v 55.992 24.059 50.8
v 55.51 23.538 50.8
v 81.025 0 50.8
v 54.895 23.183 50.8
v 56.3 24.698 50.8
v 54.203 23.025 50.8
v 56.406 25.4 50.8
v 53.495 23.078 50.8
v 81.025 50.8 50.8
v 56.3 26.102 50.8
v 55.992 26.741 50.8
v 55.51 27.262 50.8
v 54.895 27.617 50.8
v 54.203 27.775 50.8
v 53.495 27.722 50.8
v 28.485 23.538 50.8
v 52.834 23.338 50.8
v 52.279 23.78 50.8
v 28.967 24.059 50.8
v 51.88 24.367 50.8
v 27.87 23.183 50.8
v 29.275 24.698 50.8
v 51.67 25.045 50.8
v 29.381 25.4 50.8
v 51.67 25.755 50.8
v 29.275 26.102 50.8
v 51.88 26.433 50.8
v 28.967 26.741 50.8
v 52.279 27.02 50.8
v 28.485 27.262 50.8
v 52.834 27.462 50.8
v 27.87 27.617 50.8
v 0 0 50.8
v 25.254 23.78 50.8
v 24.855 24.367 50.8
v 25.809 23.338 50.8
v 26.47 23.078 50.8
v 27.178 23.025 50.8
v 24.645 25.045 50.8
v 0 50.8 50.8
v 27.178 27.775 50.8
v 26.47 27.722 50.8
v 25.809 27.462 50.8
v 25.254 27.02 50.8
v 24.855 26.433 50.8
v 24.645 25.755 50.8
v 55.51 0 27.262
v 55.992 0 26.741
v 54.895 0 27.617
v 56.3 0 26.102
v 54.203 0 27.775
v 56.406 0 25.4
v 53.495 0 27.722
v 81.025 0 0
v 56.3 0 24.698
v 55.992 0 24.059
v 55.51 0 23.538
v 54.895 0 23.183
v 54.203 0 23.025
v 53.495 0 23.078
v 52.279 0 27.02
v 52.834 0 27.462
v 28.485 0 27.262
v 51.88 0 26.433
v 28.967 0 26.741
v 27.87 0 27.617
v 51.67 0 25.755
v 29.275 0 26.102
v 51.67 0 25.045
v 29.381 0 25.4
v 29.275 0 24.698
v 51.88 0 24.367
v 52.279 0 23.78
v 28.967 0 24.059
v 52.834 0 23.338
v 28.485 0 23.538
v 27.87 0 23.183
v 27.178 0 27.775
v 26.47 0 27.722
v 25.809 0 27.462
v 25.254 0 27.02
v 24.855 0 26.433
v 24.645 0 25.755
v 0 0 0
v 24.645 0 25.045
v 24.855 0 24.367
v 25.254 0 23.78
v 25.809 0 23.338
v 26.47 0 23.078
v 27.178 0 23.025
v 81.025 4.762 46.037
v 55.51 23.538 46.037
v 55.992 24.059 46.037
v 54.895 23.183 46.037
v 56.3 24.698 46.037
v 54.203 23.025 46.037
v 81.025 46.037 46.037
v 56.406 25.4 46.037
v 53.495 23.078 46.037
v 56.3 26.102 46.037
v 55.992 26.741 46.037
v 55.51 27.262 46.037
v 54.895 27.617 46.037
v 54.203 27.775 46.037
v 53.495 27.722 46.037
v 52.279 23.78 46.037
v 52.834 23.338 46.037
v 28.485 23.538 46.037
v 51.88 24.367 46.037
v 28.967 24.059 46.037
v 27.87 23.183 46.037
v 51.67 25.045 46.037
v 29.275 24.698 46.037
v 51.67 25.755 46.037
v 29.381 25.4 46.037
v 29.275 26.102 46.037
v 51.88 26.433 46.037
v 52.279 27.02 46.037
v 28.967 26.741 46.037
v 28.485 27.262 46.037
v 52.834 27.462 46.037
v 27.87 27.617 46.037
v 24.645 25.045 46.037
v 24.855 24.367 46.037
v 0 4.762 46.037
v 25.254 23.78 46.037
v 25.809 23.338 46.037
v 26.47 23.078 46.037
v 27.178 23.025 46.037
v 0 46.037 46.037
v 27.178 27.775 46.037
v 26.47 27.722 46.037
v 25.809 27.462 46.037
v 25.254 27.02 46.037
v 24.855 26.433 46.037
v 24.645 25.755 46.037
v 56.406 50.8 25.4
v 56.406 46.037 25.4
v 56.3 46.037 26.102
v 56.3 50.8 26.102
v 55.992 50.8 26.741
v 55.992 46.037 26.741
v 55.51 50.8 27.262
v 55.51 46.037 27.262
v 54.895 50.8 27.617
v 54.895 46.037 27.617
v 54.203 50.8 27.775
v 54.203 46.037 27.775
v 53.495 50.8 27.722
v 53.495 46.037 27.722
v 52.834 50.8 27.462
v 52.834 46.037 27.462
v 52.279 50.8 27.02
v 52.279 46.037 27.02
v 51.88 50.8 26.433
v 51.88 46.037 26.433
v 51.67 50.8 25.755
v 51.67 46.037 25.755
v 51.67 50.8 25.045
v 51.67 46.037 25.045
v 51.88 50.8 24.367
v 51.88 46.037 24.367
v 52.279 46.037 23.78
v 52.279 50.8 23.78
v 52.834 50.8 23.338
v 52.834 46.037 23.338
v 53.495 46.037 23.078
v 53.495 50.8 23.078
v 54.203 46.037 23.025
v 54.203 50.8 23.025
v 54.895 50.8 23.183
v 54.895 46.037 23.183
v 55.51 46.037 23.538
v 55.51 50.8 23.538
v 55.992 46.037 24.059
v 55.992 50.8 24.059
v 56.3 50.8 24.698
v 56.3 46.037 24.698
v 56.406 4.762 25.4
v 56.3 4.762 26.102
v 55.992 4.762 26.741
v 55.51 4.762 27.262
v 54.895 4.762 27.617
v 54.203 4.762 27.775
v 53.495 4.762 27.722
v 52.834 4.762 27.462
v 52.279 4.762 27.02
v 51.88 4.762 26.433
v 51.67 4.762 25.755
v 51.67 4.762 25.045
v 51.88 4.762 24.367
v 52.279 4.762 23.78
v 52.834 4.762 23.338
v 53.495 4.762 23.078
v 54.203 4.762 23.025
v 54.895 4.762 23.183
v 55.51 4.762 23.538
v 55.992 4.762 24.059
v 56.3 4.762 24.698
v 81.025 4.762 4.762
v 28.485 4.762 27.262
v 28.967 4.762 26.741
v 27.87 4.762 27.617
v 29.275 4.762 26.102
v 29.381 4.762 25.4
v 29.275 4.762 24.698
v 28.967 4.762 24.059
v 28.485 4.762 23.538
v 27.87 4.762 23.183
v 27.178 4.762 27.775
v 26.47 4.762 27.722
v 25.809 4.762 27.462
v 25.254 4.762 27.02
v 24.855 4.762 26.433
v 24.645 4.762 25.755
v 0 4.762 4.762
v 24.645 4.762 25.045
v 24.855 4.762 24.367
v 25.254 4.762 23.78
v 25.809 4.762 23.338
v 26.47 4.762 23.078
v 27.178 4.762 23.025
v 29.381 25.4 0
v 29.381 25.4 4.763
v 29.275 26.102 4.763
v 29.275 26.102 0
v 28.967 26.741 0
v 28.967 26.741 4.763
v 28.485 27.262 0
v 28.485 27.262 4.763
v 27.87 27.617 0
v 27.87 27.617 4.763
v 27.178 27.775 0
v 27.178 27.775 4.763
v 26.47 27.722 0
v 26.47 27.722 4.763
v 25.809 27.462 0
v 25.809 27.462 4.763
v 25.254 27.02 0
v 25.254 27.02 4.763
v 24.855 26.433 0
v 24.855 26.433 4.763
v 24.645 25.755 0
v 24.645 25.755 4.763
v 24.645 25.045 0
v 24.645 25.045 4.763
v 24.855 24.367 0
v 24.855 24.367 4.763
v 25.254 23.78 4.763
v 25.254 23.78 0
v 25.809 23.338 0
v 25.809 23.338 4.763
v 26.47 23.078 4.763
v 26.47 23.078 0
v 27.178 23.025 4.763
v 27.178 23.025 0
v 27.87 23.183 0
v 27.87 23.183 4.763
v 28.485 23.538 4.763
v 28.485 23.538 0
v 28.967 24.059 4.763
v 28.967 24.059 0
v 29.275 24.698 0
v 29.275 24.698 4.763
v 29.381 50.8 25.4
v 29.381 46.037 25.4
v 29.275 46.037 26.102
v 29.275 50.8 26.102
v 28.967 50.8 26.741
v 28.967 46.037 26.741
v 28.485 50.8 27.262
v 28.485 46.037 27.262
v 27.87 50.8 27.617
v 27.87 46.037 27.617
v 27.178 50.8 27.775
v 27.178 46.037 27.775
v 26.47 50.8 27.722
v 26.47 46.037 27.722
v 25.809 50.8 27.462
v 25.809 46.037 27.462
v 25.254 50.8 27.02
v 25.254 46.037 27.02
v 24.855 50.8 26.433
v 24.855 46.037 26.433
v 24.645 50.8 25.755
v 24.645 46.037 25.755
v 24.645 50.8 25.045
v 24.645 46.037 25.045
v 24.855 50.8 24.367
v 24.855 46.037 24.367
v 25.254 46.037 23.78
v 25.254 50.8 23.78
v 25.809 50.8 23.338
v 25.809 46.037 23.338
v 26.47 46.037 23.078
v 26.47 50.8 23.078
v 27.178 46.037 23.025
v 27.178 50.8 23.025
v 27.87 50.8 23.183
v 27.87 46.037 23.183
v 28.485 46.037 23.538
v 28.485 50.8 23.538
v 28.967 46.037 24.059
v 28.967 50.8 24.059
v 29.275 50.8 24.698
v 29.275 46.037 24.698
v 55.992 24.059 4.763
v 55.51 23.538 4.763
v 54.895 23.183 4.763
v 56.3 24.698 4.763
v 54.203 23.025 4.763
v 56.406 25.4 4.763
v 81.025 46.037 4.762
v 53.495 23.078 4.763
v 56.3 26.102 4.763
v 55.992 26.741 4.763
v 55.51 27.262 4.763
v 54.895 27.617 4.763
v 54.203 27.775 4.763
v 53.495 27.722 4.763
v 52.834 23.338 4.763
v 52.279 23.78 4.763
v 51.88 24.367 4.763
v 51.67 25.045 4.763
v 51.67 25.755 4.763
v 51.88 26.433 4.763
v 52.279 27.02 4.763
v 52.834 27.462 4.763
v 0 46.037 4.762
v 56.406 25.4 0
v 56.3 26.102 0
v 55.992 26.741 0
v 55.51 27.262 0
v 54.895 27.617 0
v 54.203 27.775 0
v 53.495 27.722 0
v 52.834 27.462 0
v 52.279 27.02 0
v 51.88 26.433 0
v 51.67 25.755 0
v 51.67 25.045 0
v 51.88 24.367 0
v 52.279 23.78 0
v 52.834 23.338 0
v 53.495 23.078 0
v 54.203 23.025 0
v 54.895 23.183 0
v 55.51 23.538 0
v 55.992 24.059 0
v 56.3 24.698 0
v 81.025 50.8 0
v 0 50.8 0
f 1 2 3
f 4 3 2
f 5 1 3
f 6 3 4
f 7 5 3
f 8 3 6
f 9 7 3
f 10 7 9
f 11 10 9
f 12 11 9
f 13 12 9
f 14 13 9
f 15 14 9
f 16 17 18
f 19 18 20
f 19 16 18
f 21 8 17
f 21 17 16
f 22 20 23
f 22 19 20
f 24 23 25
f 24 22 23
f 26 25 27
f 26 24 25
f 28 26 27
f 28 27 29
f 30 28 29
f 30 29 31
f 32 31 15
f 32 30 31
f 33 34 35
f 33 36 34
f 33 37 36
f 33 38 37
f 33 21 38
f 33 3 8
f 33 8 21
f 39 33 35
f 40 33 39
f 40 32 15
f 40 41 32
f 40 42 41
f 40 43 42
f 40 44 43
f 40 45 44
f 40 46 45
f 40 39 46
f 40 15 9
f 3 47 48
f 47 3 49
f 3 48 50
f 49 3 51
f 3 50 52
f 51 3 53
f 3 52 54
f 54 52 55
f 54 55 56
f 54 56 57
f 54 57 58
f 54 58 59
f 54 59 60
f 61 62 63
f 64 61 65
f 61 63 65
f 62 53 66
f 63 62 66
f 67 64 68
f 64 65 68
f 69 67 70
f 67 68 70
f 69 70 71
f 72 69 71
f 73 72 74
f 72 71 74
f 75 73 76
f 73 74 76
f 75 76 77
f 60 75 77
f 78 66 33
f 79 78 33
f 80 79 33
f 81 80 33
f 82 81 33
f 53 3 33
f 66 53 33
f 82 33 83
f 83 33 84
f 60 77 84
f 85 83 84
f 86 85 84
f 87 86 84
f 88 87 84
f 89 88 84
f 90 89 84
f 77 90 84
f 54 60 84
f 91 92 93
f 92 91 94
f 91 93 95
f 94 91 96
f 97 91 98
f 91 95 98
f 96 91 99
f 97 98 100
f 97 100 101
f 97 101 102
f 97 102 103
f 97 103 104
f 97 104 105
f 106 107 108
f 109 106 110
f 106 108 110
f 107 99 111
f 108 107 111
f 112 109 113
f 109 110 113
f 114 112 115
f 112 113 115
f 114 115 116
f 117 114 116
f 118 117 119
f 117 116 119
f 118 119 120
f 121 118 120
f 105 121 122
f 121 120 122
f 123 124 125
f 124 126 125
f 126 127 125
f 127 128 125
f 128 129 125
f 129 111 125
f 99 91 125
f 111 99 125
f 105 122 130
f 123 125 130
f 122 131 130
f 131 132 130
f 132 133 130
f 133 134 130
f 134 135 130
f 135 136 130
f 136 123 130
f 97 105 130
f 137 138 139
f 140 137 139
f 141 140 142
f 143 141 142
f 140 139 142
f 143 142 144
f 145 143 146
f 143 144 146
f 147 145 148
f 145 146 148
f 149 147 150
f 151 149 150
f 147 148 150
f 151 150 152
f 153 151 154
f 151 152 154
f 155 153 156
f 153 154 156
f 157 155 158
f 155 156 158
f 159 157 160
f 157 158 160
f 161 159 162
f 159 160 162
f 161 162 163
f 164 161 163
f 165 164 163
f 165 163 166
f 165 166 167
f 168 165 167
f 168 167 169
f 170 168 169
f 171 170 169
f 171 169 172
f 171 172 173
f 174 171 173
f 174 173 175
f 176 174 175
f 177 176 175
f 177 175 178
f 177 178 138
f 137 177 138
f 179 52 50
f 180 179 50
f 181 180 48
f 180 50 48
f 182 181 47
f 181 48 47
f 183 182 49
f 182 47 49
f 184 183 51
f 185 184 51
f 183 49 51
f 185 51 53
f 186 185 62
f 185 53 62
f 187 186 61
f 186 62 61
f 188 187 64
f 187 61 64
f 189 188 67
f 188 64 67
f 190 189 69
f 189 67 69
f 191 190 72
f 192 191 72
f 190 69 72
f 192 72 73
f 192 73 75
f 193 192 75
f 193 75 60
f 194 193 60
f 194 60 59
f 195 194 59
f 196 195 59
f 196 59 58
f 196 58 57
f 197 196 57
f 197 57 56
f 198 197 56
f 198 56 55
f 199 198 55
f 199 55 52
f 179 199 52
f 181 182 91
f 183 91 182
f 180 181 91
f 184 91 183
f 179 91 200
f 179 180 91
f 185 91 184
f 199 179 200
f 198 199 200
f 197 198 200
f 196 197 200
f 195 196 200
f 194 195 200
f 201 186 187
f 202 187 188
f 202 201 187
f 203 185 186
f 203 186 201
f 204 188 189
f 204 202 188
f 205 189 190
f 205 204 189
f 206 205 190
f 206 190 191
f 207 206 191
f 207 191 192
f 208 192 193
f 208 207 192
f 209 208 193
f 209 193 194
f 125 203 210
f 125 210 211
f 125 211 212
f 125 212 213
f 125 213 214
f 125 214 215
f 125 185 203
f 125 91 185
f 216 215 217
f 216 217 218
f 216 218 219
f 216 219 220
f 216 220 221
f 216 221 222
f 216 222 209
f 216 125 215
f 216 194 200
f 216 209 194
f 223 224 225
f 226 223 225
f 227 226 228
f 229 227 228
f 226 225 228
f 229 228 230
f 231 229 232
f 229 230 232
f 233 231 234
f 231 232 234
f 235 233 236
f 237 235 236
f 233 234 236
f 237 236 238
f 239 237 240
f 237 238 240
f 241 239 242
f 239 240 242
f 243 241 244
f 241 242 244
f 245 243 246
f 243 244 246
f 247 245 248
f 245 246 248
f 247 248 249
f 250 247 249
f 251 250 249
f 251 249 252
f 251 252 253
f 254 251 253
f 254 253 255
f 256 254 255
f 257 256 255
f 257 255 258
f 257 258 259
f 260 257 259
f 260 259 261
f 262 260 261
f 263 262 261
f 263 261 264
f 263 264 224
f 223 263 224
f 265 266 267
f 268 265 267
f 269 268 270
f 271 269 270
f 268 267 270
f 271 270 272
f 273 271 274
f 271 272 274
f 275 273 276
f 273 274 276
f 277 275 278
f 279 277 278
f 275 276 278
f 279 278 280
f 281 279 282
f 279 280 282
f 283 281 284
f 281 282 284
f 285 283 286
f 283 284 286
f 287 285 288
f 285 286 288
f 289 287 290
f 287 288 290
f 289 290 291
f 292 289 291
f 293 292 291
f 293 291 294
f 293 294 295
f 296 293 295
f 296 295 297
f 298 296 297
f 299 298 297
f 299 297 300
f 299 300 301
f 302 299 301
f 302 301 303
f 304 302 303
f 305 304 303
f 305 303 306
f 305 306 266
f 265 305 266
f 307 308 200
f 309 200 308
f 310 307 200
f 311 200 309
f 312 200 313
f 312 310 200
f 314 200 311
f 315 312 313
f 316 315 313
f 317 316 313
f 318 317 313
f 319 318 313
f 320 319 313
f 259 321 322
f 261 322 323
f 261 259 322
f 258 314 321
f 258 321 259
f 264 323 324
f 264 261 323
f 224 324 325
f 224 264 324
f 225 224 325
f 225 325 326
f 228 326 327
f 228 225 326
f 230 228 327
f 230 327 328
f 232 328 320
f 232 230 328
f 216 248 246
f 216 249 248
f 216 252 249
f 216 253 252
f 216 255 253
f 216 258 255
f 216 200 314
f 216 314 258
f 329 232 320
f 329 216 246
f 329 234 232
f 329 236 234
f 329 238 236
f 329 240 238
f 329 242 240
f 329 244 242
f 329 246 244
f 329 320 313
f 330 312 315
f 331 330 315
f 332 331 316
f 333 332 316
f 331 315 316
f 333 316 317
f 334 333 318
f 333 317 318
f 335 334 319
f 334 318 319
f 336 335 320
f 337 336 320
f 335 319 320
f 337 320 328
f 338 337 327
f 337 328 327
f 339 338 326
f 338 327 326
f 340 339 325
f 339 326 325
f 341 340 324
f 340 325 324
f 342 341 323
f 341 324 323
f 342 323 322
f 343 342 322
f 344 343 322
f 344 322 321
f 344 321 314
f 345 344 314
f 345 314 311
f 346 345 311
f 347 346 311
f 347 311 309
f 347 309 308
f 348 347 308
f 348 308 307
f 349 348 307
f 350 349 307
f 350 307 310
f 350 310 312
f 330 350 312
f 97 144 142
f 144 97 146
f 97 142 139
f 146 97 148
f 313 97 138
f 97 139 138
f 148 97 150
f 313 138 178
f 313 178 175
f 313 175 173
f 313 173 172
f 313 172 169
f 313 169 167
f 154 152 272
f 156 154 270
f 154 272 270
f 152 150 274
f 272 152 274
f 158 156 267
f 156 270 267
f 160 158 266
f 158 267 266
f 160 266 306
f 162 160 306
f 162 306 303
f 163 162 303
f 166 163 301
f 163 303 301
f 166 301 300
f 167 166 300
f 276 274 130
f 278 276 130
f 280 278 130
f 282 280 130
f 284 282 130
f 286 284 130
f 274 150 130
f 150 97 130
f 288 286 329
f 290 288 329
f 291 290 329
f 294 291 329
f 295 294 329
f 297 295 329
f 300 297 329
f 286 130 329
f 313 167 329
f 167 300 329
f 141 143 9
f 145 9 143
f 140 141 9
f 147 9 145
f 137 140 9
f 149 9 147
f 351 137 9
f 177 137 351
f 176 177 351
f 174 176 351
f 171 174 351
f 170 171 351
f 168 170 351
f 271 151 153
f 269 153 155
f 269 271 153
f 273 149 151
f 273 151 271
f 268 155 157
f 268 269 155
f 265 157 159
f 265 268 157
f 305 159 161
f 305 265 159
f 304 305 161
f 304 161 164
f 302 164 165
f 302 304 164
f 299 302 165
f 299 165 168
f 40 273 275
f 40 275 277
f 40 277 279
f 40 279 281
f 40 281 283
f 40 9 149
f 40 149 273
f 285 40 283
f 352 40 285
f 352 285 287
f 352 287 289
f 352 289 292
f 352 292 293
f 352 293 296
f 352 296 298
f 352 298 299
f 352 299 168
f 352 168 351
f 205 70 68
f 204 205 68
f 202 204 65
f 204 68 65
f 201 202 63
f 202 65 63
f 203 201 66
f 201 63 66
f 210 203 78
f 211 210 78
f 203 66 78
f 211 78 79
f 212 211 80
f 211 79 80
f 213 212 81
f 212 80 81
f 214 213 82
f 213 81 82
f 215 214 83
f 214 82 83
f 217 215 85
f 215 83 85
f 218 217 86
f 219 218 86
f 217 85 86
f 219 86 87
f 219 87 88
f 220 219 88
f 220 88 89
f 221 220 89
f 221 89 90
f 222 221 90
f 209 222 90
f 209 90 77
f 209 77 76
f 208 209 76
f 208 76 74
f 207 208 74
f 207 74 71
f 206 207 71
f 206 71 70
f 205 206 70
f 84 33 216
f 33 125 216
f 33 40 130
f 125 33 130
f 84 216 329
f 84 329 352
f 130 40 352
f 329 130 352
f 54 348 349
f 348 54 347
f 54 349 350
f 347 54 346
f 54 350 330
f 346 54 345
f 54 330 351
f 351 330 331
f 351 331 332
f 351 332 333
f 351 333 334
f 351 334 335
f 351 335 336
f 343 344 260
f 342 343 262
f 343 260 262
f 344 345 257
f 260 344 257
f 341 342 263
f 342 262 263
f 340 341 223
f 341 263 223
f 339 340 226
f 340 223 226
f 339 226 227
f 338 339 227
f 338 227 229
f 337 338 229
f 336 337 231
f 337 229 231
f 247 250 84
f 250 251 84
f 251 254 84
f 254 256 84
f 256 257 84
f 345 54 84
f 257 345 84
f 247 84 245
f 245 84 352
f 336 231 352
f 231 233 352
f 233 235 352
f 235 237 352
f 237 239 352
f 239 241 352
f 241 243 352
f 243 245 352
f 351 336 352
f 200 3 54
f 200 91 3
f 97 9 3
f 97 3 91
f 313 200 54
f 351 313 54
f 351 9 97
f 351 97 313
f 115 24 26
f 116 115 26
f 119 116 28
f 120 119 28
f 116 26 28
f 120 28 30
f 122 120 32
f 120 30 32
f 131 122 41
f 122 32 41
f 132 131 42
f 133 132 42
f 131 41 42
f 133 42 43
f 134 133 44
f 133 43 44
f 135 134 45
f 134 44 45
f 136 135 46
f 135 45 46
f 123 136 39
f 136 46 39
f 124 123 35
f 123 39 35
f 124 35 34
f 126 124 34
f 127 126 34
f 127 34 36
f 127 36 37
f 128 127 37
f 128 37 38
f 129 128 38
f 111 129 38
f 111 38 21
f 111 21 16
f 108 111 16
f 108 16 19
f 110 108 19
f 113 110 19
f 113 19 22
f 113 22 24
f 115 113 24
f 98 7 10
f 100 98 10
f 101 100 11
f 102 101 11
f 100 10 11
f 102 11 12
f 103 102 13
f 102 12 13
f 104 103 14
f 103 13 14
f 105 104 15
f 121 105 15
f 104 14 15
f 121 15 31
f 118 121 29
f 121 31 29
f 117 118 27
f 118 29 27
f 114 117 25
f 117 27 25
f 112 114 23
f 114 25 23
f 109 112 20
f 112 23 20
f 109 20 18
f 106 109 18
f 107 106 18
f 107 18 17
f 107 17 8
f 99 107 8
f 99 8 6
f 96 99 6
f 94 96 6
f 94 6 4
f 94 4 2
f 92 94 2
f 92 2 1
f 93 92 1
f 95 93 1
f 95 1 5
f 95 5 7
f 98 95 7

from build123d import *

# Parameters (mm, degrees)
SKETCH1_W           = 50.8
SKETCH1_H           = 50.8
SKETCH1_W_2         = 41.275
SKETCH1_H_2         = 41.275
BOSS_EXTRUDE1_DEPTH = 81.025
SKETCH2_R           = 2.38125
CUT_EXTRUDE1_DEPTH  = 50.8
SKETCH3_R           = 2.38125
CUT_EXTRUDE2_DEPTH  = 52.324


with BuildPart() as part:
    # Sketch1 → Boss-Extrude1 (new body)
    with BuildSketch(Plane(origin=(0, 0, 0), x_dir=(0, 0, -1), z_dir=(1, 0, 0))):
        with Locations((-25.4, 25.4)):
            Rectangle(SKETCH1_W, SKETCH1_H)
        with Locations((-25.4, 25.4)):
            Rectangle(SKETCH1_W_2, SKETCH1_H_2, mode=Mode.SUBTRACT)
    extrude(amount=BOSS_EXTRUDE1_DEPTH)

    # Sketch2 → Cut-Extrude1 (cut)
    with BuildSketch(Plane.XY.offset(50.8)):
        with Locations((27, 25.4)):
            Circle(SKETCH2_R)
        with Locations((54.025, 25.4)):
            Circle(SKETCH2_R)
    extrude(amount=-CUT_EXTRUDE1_DEPTH, mode=Mode.SUBTRACT)

    # Sketch3 → Cut-Extrude2 (cut)
    with BuildSketch(Plane.XZ):
        with Locations((27, 25.4)):
            Circle(SKETCH3_R)
        with Locations((54.025, 25.4)):
            Circle(SKETCH3_R)
    extrude(amount=-CUT_EXTRUDE2_DEPTH, mode=Mode.SUBTRACT)


solid = part.part
